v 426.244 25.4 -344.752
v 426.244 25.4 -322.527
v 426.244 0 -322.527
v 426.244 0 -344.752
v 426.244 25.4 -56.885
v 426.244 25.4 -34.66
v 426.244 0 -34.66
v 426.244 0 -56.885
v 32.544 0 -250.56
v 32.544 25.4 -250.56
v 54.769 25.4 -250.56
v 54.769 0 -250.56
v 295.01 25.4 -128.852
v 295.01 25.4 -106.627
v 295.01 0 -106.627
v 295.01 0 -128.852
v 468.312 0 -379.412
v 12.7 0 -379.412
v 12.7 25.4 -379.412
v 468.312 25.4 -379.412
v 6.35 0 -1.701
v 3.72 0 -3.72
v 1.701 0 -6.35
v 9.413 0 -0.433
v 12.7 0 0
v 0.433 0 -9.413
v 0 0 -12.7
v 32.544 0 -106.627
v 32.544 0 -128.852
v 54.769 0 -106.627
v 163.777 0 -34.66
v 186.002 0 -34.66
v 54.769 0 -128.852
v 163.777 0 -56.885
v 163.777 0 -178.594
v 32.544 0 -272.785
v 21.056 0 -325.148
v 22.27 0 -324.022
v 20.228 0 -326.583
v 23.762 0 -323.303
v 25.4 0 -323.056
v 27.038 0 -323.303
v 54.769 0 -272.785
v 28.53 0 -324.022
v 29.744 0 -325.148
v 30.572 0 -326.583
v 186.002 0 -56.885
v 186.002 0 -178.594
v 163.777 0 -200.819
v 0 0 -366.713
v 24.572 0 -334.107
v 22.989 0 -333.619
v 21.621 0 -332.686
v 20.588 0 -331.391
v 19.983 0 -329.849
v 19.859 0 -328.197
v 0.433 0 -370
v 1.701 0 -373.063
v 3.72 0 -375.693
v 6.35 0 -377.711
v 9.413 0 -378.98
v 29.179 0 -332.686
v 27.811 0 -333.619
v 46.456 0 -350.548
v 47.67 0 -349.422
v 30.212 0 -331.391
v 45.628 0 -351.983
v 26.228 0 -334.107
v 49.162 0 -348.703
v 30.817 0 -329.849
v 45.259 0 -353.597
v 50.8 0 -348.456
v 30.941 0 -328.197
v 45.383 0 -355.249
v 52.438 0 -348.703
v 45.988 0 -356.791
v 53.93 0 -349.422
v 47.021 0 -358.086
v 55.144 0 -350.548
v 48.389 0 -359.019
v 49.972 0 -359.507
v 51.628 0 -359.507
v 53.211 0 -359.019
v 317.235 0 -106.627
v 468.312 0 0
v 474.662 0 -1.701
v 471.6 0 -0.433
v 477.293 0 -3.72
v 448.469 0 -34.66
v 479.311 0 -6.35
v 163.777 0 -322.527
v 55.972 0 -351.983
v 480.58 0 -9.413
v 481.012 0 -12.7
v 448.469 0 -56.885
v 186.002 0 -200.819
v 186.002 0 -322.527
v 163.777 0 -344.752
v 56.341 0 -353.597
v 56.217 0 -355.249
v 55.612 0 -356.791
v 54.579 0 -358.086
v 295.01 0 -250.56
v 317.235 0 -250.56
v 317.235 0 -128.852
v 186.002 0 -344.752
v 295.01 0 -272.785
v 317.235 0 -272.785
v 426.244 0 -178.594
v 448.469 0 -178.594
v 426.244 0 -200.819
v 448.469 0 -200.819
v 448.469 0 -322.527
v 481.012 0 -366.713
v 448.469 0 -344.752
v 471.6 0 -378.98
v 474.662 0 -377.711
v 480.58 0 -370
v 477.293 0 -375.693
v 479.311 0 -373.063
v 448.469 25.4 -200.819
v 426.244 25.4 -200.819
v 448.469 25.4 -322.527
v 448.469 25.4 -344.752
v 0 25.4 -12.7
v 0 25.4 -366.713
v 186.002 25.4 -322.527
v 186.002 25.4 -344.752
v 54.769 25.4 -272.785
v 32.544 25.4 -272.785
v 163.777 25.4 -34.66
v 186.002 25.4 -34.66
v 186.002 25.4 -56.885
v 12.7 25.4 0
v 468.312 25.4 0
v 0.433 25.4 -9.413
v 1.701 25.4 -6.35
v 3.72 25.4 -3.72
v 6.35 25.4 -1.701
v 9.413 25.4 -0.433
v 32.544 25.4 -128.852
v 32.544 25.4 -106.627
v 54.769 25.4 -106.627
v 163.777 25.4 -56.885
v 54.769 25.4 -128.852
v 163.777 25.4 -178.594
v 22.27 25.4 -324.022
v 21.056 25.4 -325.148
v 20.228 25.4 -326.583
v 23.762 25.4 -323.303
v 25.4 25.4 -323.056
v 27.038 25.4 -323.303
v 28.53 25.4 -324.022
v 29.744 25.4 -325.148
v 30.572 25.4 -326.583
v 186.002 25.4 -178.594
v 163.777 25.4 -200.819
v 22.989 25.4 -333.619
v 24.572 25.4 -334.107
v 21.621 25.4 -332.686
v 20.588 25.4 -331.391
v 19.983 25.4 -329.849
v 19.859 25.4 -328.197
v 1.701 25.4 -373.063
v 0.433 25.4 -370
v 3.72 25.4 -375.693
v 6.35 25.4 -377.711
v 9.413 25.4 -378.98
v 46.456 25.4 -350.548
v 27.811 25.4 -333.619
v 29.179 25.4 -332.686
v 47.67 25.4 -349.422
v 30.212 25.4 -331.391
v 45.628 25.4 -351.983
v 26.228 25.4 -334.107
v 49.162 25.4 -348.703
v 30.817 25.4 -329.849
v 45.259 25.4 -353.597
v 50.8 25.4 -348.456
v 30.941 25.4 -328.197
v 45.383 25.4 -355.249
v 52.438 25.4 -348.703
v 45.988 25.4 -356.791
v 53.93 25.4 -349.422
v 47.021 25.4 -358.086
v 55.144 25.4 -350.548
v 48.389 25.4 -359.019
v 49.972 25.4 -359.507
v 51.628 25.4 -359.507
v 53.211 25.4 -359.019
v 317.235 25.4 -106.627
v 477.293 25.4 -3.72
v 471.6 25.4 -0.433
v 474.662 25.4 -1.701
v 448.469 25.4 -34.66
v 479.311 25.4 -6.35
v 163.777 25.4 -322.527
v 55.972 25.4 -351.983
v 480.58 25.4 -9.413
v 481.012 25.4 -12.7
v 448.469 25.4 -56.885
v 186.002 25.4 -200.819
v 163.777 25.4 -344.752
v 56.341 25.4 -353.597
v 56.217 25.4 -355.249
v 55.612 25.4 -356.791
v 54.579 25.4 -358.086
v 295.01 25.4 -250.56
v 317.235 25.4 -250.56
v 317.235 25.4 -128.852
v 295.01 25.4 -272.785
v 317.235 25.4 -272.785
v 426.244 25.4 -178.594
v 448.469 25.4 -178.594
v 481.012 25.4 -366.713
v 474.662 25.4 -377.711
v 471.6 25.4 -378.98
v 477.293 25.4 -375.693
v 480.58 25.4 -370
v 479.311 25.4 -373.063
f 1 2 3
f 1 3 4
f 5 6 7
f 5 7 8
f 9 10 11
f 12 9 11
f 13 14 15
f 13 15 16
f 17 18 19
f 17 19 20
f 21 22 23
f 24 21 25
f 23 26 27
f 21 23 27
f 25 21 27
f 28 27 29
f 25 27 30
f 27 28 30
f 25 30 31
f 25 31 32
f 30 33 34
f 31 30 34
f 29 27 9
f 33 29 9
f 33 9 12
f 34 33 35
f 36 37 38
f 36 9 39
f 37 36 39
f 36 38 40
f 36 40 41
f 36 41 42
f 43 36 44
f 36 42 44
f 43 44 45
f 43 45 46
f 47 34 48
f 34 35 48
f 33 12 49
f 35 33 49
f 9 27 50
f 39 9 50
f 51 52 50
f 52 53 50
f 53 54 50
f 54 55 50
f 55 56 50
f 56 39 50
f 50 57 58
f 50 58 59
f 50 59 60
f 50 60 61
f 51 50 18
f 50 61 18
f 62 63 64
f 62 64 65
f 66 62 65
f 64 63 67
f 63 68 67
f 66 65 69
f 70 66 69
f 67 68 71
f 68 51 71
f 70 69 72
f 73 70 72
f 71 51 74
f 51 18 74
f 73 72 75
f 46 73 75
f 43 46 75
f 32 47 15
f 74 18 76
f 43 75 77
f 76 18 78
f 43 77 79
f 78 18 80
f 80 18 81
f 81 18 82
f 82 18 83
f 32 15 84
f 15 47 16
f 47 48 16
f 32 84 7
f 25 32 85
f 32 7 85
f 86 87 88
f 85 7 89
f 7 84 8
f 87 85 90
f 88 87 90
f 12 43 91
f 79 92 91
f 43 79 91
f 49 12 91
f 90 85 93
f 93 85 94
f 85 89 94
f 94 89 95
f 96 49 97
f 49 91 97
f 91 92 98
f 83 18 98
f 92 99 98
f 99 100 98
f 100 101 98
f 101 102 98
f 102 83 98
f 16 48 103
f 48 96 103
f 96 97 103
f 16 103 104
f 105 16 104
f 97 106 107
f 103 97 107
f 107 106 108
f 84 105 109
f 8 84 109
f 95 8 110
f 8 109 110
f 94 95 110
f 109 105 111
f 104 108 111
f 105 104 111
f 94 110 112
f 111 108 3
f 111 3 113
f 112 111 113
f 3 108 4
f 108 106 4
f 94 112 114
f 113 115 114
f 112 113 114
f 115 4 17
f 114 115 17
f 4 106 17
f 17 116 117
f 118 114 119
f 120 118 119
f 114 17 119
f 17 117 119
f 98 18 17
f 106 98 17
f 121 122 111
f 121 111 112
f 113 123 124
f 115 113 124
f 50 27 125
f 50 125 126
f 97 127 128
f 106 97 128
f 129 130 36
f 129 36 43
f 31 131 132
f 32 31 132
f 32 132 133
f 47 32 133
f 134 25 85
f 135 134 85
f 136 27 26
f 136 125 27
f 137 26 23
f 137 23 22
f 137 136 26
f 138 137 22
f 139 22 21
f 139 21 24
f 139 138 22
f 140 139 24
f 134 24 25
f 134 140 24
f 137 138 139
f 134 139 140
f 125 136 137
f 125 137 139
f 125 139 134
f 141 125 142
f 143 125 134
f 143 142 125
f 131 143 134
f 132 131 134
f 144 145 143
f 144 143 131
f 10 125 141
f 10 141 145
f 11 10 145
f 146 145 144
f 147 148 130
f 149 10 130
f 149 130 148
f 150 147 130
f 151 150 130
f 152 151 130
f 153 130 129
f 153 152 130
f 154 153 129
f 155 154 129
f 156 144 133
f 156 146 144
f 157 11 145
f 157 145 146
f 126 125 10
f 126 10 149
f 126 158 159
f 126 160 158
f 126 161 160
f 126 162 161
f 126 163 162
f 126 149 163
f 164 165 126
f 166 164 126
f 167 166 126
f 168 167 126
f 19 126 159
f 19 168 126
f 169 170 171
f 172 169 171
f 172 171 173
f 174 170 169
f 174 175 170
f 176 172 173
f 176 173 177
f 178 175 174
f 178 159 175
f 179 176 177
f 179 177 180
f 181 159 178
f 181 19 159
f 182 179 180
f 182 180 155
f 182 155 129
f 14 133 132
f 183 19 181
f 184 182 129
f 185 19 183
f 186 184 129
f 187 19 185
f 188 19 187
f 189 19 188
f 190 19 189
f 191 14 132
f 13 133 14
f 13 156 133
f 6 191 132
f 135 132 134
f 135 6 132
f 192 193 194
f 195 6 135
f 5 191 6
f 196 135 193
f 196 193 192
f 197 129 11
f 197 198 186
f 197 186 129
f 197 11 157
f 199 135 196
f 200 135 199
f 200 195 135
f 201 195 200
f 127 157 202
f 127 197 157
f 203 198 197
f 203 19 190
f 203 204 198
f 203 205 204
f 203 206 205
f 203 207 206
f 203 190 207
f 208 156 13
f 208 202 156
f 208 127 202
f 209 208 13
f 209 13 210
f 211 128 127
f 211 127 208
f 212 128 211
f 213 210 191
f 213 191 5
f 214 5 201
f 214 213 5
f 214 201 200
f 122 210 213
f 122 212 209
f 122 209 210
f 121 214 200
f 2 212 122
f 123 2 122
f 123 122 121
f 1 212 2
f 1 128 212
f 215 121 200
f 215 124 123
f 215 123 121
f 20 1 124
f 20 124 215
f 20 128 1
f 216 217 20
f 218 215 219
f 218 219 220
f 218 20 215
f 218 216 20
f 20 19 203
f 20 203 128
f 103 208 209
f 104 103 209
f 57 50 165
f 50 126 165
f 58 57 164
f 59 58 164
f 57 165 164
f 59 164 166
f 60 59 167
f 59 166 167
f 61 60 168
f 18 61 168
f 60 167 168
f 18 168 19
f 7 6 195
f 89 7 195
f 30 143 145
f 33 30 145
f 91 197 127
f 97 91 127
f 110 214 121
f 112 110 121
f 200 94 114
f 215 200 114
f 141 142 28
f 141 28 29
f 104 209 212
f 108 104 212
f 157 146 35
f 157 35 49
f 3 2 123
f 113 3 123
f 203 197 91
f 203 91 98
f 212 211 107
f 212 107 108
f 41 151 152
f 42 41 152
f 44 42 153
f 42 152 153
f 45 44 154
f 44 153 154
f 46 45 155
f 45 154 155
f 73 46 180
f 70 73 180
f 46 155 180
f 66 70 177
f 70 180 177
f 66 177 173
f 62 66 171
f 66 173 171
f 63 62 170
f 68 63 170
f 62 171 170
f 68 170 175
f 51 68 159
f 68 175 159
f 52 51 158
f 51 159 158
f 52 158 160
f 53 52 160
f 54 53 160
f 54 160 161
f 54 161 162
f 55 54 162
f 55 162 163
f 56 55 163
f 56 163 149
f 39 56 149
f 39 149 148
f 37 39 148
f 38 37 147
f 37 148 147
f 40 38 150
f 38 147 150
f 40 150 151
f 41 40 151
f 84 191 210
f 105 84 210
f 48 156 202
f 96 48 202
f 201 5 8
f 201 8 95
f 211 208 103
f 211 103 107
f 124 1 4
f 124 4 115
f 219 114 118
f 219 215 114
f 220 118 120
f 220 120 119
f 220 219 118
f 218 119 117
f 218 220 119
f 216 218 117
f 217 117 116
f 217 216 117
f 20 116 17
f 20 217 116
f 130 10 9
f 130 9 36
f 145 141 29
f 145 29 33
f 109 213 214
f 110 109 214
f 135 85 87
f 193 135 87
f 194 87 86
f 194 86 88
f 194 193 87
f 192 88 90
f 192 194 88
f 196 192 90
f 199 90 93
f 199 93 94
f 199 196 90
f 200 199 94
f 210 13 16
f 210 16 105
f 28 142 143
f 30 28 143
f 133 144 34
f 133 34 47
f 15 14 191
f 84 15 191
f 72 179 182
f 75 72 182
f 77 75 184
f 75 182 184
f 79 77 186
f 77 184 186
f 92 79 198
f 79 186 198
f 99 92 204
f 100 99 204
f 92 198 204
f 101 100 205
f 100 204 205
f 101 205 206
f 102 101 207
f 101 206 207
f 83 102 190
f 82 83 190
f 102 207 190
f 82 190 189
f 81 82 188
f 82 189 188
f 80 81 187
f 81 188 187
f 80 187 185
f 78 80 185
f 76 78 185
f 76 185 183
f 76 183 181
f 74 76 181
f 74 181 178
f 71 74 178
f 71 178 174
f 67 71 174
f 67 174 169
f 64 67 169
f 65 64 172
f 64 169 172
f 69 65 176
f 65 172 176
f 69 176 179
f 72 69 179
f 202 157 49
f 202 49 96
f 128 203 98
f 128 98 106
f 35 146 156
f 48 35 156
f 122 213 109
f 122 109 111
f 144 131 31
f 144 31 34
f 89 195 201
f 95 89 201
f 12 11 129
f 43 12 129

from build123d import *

# Parameters (mm, degrees)
SKETCH1_W           = 481.0125
SKETCH1_H           = 379.4125
BOSS_EXTRUDE1_DEPTH = 25.4
FILLET1_R           = 12.7
SKETCH2_W           = 22.225
SKETCH2_H           = 22.225
CUT_EXTRUDE2_DEPTH  = 25.4
SKETCH3_R           = 5.55625
CUT_EXTRUDE3_DEPTH  = 25.4


with BuildPart() as part:
    # Sketch1 → Boss-Extrude1 (new body)
    with BuildSketch(Plane(origin=(0, 0, 0), x_dir=(1, 0, 0), z_dir=(0, 1, 0))):
        with Locations((240.50625, 189.70625)):
            Rectangle(SKETCH1_W, SKETCH1_H)
    extrude(amount=BOSS_EXTRUDE1_DEPTH)

    # Fillet1
    fillet1_edges = [part.edges().sort_by_distance(p)[0] for p in [
        (0, 12.7, -379.4125),
        (481.0125, 12.7, -379.4125),
        (481.0125, 12.7, 0),
        (0, 12.7, 0),
    ]]
    fillet(fillet1_edges, radius=FILLET1_R)

    # Sketch2 → Cut-Extrude2 (cut)
    with BuildSketch(Plane(origin=(0, 25.4, 0), x_dir=(1, 0, 0), z_dir=(0, 1, 0))):
        with Locations((43.65625, 117.739583291)):
            Rectangle(SKETCH2_W, SKETCH2_H)
        with Locations((43.65625, 261.672916709)):
            Rectangle(SKETCH2_W, SKETCH2_H)
        with Locations((174.889583418, 45.772916582)):
            Rectangle(SKETCH2_W, SKETCH2_H)
        with Locations((306.122916582, 117.739583291)):
            Rectangle(SKETCH2_W, SKETCH2_H)
        with Locations((437.35625, 45.772916582)):
            Rectangle(SKETCH2_W, SKETCH2_H)
        with Locations((437.35625, 189.70625)):
            Rectangle(SKETCH2_W, SKETCH2_H)
        with Locations((437.35625, 333.639583418)):
            Rectangle(SKETCH2_W, SKETCH2_H)
        with Locations((174.889583418, 189.70625)):
            Rectangle(SKETCH2_W, SKETCH2_H)
        with Locations((174.889583418, 333.639583418)):
            Rectangle(SKETCH2_W, SKETCH2_H)
        with Locations((306.122916582, 261.672916709)):
            Rectangle(SKETCH2_W, SKETCH2_H)
    extrude(amount=-CUT_EXTRUDE2_DEPTH, mode=Mode.SUBTRACT)

    # Sketch3 → Cut-Extrude3 (cut)
    with BuildSketch(Plane(origin=(0, 25.4, 0), x_dir=(1, 0, 0), z_dir=(0, 1, 0))):
        with Locations(Location((25.4, 328.6125, 0), (0, 0, 270))):
            Circle(SKETCH3_R)
        with Locations(Location((50.8, 354.0125, 0), (0, 0, 270))):
            Circle(SKETCH3_R)
    extrude(amount=-CUT_EXTRUDE3_DEPTH, mode=Mode.SUBTRACT)


solid = part.part
